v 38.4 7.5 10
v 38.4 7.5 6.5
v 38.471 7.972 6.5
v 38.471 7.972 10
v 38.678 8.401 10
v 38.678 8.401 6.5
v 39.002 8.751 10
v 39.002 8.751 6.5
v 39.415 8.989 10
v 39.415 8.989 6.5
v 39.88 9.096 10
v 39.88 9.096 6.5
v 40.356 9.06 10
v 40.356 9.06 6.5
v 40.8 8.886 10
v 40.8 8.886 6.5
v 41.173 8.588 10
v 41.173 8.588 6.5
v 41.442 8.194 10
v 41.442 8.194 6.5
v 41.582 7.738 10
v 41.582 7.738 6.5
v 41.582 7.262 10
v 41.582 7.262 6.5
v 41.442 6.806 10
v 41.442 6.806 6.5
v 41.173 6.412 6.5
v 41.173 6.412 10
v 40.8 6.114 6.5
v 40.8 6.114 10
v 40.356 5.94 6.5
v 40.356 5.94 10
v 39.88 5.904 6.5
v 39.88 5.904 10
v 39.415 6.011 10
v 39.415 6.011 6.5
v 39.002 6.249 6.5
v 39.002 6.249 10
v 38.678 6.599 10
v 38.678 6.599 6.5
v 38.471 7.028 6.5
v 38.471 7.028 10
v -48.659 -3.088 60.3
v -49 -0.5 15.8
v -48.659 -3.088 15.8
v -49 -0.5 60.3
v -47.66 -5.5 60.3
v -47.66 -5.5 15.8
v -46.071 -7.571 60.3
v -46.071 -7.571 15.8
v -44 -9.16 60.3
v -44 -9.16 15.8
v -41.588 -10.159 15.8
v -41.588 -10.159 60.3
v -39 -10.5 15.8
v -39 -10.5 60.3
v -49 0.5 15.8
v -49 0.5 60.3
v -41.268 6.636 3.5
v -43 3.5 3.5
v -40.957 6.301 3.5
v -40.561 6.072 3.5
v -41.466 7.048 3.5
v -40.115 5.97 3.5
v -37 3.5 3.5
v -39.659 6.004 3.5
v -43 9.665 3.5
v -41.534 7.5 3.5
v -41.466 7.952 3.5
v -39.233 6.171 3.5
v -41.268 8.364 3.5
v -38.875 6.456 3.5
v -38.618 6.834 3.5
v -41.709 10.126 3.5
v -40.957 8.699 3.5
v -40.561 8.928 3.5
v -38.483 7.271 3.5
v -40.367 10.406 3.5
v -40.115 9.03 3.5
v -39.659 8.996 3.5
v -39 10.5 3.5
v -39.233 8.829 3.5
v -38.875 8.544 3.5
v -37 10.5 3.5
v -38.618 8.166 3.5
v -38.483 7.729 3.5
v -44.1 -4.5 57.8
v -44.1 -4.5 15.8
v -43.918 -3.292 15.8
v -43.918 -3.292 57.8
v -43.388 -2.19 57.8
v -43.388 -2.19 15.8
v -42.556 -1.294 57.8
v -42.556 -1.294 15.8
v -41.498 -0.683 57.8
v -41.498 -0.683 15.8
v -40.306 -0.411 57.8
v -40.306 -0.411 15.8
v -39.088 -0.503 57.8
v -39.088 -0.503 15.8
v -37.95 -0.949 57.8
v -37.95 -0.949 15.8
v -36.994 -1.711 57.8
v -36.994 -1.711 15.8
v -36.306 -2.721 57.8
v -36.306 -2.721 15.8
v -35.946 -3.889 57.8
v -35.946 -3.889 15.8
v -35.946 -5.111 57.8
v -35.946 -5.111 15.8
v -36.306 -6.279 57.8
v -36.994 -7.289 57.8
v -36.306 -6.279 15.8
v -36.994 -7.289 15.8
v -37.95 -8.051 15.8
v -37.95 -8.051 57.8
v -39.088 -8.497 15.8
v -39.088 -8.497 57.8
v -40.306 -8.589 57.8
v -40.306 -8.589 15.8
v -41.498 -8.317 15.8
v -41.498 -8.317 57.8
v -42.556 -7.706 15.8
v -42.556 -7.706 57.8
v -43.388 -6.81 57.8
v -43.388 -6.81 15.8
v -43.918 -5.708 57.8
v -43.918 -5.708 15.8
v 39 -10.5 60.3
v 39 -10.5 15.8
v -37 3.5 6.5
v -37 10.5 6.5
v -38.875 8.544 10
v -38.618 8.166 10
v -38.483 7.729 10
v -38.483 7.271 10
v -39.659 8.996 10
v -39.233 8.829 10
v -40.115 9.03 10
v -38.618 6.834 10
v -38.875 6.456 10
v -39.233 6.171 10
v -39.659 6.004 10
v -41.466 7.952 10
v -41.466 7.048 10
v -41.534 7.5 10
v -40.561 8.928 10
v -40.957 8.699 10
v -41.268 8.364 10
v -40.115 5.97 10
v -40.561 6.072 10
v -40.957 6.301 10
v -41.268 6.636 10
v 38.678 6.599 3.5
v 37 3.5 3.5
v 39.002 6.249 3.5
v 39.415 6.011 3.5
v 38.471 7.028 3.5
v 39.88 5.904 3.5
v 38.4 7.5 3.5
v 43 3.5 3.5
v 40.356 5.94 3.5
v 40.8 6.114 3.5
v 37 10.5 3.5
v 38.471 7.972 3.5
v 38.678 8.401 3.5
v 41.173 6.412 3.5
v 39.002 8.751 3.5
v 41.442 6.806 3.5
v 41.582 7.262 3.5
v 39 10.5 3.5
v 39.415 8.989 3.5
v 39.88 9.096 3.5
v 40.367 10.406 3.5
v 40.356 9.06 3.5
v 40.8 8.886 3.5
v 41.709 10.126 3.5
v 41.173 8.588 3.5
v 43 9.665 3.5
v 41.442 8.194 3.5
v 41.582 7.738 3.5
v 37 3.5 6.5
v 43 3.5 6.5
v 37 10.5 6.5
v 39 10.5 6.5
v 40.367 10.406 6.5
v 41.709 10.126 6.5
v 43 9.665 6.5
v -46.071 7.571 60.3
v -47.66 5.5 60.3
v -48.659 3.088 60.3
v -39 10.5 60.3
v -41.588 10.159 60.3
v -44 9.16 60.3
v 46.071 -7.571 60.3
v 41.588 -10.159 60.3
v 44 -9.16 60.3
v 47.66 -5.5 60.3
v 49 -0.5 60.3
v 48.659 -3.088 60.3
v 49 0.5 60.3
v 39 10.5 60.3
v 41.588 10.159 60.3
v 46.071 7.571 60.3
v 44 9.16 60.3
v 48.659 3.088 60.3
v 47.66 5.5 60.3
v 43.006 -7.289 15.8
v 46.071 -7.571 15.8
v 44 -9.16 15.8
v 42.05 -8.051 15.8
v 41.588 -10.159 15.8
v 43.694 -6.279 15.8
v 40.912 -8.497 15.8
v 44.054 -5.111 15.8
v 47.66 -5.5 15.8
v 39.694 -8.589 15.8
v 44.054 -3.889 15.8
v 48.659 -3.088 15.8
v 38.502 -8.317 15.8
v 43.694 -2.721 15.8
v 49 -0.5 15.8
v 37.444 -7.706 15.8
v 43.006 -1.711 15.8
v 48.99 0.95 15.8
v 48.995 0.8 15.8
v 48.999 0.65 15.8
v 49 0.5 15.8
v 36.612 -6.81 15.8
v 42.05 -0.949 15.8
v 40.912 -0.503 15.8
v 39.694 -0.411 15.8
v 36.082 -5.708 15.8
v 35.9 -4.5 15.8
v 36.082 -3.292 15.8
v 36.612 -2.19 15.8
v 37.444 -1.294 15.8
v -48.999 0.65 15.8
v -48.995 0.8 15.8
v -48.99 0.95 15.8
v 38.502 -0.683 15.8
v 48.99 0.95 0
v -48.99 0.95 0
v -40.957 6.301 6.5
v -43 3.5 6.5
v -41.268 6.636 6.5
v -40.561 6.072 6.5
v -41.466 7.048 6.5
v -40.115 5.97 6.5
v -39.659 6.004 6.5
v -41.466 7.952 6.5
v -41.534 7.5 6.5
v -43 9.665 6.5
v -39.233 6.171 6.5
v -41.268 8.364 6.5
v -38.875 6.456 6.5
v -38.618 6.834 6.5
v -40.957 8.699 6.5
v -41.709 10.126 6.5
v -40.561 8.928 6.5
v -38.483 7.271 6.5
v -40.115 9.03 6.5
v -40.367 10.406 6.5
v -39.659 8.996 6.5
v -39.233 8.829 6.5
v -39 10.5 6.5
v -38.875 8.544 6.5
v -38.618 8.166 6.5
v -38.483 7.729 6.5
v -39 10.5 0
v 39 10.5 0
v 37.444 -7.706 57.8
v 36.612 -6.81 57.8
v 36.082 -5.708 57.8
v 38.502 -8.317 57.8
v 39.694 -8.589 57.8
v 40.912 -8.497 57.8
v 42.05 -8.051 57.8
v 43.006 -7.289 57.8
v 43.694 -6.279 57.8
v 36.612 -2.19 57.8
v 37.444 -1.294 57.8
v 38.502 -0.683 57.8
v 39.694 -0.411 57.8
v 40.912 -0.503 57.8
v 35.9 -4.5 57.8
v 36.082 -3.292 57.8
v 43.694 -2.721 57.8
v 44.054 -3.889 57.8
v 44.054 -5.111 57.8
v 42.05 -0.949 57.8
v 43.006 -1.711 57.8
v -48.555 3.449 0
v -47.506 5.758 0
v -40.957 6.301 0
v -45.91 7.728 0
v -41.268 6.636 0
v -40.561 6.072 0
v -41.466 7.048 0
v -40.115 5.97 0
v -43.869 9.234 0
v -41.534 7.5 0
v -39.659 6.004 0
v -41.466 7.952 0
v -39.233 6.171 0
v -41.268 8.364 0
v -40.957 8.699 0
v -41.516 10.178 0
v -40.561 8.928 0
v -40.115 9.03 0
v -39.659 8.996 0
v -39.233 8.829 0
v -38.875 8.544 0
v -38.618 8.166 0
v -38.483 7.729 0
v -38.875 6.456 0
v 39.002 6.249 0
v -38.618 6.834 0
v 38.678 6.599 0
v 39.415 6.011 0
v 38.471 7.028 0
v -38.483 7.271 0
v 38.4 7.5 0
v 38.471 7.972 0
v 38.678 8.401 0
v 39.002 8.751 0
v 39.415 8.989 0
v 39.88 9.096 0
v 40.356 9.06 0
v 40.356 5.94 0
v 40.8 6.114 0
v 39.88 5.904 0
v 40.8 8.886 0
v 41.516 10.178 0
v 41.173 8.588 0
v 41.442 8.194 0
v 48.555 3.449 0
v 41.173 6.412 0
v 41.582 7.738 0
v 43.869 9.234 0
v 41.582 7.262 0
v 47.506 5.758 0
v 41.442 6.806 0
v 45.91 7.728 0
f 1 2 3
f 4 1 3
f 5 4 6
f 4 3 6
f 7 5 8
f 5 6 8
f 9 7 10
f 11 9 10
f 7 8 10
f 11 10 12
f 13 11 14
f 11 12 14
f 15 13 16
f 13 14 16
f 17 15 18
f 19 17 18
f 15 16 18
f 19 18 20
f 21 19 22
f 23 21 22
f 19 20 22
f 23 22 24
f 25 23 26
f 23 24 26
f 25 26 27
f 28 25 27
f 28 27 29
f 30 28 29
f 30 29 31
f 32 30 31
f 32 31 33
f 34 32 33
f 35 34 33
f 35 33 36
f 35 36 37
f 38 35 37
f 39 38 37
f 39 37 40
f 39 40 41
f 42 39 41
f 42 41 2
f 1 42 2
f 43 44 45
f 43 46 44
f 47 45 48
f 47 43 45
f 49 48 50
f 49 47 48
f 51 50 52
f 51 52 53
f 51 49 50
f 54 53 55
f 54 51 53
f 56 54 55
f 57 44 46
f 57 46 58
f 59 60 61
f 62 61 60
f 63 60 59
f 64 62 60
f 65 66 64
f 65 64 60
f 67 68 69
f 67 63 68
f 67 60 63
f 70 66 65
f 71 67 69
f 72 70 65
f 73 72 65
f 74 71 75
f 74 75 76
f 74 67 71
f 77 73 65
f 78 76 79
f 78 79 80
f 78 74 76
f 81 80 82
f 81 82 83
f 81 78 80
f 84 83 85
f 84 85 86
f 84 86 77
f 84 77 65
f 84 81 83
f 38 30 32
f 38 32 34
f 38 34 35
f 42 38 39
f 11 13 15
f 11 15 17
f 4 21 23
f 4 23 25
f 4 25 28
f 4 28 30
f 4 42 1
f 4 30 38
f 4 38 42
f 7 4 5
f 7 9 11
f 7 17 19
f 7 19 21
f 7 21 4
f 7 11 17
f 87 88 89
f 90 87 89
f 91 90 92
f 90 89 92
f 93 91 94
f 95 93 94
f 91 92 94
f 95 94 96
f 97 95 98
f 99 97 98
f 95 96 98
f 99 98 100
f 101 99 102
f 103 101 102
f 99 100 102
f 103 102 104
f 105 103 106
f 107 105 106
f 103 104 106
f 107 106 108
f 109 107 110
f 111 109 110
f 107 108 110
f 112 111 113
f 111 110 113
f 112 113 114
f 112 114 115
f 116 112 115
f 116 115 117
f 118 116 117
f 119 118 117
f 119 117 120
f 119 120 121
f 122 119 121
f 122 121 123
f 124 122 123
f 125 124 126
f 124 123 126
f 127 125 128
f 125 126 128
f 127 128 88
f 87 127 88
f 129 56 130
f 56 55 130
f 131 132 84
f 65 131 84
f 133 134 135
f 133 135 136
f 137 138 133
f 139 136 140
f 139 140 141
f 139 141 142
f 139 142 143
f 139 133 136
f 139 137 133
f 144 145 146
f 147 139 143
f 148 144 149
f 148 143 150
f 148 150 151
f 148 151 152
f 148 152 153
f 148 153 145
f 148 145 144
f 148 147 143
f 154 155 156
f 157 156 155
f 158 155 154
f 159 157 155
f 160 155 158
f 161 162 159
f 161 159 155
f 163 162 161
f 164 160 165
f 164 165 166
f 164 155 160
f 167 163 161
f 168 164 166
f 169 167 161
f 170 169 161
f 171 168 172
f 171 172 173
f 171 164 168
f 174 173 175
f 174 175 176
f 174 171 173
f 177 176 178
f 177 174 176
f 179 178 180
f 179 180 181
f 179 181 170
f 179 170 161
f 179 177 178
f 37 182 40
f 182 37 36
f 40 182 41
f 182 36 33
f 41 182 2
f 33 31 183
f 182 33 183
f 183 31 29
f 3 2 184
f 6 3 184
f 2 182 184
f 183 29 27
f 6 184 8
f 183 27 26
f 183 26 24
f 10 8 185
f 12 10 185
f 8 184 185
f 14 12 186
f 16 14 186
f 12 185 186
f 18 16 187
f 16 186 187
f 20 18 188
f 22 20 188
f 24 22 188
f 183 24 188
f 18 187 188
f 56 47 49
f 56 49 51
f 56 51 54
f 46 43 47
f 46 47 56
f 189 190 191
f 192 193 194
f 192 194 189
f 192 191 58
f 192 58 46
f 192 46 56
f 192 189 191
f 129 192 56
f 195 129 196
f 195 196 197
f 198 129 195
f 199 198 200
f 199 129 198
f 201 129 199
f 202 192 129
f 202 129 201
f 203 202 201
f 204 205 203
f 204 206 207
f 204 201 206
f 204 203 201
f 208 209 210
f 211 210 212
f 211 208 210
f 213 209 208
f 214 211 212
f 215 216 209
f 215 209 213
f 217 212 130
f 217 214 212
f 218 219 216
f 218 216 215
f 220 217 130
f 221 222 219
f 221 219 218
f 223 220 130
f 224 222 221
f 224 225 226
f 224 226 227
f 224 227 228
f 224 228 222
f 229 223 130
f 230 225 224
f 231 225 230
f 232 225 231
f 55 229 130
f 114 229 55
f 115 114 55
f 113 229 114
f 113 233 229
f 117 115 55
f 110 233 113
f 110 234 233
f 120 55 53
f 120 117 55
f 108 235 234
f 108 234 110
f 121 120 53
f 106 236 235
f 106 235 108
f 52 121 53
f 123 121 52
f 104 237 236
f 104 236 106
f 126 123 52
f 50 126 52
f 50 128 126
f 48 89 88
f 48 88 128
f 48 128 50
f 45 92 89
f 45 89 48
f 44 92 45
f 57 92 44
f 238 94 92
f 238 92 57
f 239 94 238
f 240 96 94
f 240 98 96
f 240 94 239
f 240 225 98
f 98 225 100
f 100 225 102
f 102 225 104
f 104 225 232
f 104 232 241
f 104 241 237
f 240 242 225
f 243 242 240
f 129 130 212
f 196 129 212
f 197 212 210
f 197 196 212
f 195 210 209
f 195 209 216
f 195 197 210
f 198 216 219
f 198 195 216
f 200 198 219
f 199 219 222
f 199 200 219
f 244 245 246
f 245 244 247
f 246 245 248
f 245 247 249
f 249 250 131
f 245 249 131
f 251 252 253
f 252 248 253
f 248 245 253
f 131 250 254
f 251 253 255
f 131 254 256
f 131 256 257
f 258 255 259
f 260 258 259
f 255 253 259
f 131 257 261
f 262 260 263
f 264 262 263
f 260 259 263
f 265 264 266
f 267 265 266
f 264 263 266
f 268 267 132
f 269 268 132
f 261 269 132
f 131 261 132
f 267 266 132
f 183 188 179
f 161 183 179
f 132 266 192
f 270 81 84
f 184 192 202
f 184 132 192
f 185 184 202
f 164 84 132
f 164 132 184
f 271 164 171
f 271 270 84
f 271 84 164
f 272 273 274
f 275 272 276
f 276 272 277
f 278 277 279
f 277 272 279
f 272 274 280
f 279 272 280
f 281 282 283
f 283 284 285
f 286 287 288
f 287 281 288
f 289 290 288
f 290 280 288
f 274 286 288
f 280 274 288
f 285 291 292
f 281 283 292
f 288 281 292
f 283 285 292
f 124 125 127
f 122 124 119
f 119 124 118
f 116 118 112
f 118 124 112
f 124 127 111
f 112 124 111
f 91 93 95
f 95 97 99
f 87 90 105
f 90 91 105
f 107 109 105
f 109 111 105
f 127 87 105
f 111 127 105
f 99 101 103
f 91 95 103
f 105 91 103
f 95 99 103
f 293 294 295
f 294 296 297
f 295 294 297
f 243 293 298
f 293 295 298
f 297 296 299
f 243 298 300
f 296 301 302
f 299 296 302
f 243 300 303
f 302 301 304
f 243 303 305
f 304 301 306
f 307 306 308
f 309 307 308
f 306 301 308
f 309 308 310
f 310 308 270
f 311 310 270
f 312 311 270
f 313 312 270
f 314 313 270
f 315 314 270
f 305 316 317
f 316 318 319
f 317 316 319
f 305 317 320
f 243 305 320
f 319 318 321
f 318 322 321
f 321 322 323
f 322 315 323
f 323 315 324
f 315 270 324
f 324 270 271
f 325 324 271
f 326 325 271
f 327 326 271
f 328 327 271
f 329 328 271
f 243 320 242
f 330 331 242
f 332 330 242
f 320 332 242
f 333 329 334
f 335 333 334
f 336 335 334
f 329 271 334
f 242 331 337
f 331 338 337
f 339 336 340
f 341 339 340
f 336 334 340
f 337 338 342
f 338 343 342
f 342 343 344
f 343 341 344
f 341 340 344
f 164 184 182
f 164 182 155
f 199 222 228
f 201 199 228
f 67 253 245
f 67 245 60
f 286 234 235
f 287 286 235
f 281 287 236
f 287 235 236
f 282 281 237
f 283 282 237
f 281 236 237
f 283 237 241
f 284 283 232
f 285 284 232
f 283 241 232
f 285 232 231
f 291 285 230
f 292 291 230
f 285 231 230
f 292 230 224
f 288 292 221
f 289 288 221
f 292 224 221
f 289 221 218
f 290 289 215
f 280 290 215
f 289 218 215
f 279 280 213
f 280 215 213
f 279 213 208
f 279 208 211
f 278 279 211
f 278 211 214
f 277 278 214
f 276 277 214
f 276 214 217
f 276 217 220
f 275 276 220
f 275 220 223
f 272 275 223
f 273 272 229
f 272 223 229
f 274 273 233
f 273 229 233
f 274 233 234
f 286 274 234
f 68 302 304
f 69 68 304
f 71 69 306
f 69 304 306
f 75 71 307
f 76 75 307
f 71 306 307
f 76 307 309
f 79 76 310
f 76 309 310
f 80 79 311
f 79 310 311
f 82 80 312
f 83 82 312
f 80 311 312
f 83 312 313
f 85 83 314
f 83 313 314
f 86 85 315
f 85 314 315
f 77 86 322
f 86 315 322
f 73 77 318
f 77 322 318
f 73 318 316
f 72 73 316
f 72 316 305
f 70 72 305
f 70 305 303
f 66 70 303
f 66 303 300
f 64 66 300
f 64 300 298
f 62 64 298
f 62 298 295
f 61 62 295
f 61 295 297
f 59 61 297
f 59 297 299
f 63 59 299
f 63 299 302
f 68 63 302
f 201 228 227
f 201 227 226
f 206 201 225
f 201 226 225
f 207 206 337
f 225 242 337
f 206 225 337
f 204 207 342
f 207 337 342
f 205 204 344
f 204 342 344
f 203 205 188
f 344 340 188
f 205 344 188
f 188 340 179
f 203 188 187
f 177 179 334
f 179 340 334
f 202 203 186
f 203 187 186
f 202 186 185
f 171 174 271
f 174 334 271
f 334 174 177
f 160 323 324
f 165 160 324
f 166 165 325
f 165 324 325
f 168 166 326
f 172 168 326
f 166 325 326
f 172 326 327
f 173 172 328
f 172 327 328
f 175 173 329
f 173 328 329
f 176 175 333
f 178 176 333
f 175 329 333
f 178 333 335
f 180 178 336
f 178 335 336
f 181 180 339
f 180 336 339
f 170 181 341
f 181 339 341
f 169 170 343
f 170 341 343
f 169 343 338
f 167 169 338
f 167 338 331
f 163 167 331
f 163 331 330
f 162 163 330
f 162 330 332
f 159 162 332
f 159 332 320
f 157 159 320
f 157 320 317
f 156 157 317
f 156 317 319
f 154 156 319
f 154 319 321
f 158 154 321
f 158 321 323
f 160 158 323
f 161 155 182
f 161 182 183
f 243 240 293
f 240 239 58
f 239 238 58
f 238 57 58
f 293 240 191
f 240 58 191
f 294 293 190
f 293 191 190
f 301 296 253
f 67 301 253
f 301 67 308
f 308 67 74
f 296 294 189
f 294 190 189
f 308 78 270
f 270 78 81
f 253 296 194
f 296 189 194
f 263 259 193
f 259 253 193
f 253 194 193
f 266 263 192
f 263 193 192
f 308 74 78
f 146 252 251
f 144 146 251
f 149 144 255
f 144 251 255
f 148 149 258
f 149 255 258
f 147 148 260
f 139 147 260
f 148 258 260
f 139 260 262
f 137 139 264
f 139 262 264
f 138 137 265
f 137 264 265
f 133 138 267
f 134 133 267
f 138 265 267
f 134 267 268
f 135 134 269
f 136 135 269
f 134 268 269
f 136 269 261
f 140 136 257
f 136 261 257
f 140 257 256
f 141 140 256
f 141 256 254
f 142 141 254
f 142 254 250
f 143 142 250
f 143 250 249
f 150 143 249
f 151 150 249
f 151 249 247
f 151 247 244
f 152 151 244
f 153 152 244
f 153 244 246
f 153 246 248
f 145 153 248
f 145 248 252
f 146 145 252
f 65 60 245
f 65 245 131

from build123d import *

# Parameters (mm, degrees)
SKETCH_1_W          = 49
SKETCH_1_H          = 21
SKETCH_1_R          = 4.1
SKETCH_1_R_2        = 1.6
EXTRUDE_1_DEPTH     = 57.8
SKETCH_4_W          = 98
SKETCH_4_H          = 11.45
CUT_EXTRUDE_3_DEPTH = 15.8
SKETCH_5_R          = 4.1
CUT_EXTRUDE_4_DEPTH = 42
SKETCH_6_W          = 98
SKETCH_6_H          = 21
EXTRUDE_2_DEPTH     = 2.5
SKETCH_7_R          = 1.6
SKETCH_7_R_2        = 1.534199572
CUT_EXTRUDE_5_DEPTH = 10
SKETCH_8_W          = 6
SKETCH_8_H          = 3
CUT_EXTRUDE_6_DEPTH = 7
FILLET_1_R          = 10
FILLET_2_R          = 10
FILLET_3_R          = 10
FILLET_4_R          = 10


with BuildPart() as part:
    # 草图1 → 凸台-拉伸1 (new body)
    # profile 1 of 6: a face of its own
    with BuildSketch(Plane.XY):
        with Locations((-24.5, 0)):
            Rectangle(SKETCH_1_W, SKETCH_1_H)
        with Locations((-40, -4.5)):
            Circle(SKETCH_1_R, mode=Mode.SUBTRACT)
        with Locations((-40, 7.5)):
            Circle(SKETCH_1_R_2, mode=Mode.SUBTRACT)
    # profile 2 of 6: a face of its own
    with BuildSketch(Plane.XY):
        with Locations((-40, -4.5)):
            Circle(SKETCH_1_R)
    # profile 3 of 6: a face of its own
    with BuildSketch(Plane.XY):
        with Locations((-40, 7.5)):
            Circle(SKETCH_1_R_2)
    # profile 4 of 6: a face of its own
    with BuildSketch(Plane.XY):
        with Locations((24.5, 0)):
            Rectangle(SKETCH_1_W, SKETCH_1_H)
        with Locations((40, -4.5)):
            Circle(SKETCH_1_R, mode=Mode.SUBTRACT)
        with Locations((40, 7.5)):
            Circle(SKETCH_1_R_2, mode=Mode.SUBTRACT)
    # profile 5 of 6: a face of its own
    with BuildSketch(Plane.XY):
        with Locations((40, -4.5)):
            Circle(SKETCH_1_R)
    # profile 6 of 6: a face of its own
    with BuildSketch(Plane.XY):
        with Locations((40, 7.5)):
            Circle(SKETCH_1_R_2)
    extrude(amount=EXTRUDE_1_DEPTH)

    # 草图4 → 切除-拉伸3 (cut)
    with BuildSketch(Plane(origin=(0, 0, 0), x_dir=(-1, 0, 0), z_dir=(0, 0, -1))):
        with Locations((0, -4.775)):
            Rectangle(SKETCH_4_W, SKETCH_4_H)
    extrude(amount=-CUT_EXTRUDE_3_DEPTH, mode=Mode.SUBTRACT)

    # 草图5 → 切除-拉伸4 (cut)
    with BuildSketch(Plane(origin=(0, 0, 15.8), x_dir=(-1, 0, 0), z_dir=(0, 0, -1))):
        with Locations((-40, -4.5)):
            Circle(SKETCH_5_R)
        with Locations((40, -4.5)):
            Circle(SKETCH_5_R)
    extrude(amount=-CUT_EXTRUDE_4_DEPTH, mode=Mode.SUBTRACT)

    # 草图6 → 凸台-拉伸2 (add)
    with BuildSketch(Plane.XY.offset(57.8)):
        Rectangle(SKETCH_6_W, SKETCH_6_H)
    extrude(amount=EXTRUDE_2_DEPTH)

    # 草图7 → 切除-拉伸5 (cut)
    with BuildSketch(Plane(origin=(0, 0, 0), x_dir=(-1, 0, 0), z_dir=(0, 0, -1))):
        with Locations((-40, 7.5)):
            Circle(SKETCH_7_R)
        with Locations((40, 7.5)):
            Circle(SKETCH_7_R_2)
    extrude(amount=-CUT_EXTRUDE_5_DEPTH, mode=Mode.SUBTRACT)

    # 草图8 → 切除-拉伸6 (cut)
    with BuildSketch(Plane(origin=(0, 10.5, 0), x_dir=(1, 0, 0), z_dir=(0, 1, 0))):
        with Locations((-40, -5)):
            Rectangle(SKETCH_8_W, SKETCH_8_H)
        with Locations((40, -5)):
            Rectangle(SKETCH_8_W, SKETCH_8_H)
    extrude(amount=-CUT_EXTRUDE_6_DEPTH, mode=Mode.SUBTRACT)

    # 圆角1
    # the kernel refuses this fillet: 10 mm, written as the material it takes off along each edge
    with BuildSketch(Plane(origin=(49, 10.5, -25), x_dir=(0, -1, 0), z_dir=(0, 0, 1))) as fillet_1_piece_1:
        with BuildLine():
            CenterArc((FILLET_1_R, -FILLET_1_R), FILLET_1_R, 90, 90)
            Line((0, -FILLET_1_R), (0, 0))
            Line((0, 0), (FILLET_1_R, 0))
        make_face()
    extrude(amount=110.3, mode=Mode.SUBTRACT)

    # 圆角2
    # the kernel refuses this fillet: 10 mm, written as the material it takes off along each edge
    with BuildSketch(Plane(origin=(-49, 10.5, 85.3), x_dir=(0, -1, 0), z_dir=(0, 0, -1))) as fillet_2_piece_1:
        with BuildLine():
            CenterArc((FILLET_2_R, -FILLET_2_R), FILLET_2_R, 90, 90)
            Line((0, -FILLET_2_R), (0, 0))
            Line((0, 0), (FILLET_2_R, 0))
        make_face()
    extrude(amount=110.3, mode=Mode.SUBTRACT)

    # 圆角3
    fillet_3_edges = [part.edges().sort_by_distance(p)[0] for p in [
        (-49, -10.5, 38.05),
    ]]
    fillet(fillet_3_edges, radius=FILLET_3_R)

    # 圆角4
    fillet_4_edges = [part.edges().sort_by_distance(p)[0] for p in [
        (49, -10.5, 38.05),
    ]]
    fillet(fillet_4_edges, radius=FILLET_4_R)


solid = part.part
